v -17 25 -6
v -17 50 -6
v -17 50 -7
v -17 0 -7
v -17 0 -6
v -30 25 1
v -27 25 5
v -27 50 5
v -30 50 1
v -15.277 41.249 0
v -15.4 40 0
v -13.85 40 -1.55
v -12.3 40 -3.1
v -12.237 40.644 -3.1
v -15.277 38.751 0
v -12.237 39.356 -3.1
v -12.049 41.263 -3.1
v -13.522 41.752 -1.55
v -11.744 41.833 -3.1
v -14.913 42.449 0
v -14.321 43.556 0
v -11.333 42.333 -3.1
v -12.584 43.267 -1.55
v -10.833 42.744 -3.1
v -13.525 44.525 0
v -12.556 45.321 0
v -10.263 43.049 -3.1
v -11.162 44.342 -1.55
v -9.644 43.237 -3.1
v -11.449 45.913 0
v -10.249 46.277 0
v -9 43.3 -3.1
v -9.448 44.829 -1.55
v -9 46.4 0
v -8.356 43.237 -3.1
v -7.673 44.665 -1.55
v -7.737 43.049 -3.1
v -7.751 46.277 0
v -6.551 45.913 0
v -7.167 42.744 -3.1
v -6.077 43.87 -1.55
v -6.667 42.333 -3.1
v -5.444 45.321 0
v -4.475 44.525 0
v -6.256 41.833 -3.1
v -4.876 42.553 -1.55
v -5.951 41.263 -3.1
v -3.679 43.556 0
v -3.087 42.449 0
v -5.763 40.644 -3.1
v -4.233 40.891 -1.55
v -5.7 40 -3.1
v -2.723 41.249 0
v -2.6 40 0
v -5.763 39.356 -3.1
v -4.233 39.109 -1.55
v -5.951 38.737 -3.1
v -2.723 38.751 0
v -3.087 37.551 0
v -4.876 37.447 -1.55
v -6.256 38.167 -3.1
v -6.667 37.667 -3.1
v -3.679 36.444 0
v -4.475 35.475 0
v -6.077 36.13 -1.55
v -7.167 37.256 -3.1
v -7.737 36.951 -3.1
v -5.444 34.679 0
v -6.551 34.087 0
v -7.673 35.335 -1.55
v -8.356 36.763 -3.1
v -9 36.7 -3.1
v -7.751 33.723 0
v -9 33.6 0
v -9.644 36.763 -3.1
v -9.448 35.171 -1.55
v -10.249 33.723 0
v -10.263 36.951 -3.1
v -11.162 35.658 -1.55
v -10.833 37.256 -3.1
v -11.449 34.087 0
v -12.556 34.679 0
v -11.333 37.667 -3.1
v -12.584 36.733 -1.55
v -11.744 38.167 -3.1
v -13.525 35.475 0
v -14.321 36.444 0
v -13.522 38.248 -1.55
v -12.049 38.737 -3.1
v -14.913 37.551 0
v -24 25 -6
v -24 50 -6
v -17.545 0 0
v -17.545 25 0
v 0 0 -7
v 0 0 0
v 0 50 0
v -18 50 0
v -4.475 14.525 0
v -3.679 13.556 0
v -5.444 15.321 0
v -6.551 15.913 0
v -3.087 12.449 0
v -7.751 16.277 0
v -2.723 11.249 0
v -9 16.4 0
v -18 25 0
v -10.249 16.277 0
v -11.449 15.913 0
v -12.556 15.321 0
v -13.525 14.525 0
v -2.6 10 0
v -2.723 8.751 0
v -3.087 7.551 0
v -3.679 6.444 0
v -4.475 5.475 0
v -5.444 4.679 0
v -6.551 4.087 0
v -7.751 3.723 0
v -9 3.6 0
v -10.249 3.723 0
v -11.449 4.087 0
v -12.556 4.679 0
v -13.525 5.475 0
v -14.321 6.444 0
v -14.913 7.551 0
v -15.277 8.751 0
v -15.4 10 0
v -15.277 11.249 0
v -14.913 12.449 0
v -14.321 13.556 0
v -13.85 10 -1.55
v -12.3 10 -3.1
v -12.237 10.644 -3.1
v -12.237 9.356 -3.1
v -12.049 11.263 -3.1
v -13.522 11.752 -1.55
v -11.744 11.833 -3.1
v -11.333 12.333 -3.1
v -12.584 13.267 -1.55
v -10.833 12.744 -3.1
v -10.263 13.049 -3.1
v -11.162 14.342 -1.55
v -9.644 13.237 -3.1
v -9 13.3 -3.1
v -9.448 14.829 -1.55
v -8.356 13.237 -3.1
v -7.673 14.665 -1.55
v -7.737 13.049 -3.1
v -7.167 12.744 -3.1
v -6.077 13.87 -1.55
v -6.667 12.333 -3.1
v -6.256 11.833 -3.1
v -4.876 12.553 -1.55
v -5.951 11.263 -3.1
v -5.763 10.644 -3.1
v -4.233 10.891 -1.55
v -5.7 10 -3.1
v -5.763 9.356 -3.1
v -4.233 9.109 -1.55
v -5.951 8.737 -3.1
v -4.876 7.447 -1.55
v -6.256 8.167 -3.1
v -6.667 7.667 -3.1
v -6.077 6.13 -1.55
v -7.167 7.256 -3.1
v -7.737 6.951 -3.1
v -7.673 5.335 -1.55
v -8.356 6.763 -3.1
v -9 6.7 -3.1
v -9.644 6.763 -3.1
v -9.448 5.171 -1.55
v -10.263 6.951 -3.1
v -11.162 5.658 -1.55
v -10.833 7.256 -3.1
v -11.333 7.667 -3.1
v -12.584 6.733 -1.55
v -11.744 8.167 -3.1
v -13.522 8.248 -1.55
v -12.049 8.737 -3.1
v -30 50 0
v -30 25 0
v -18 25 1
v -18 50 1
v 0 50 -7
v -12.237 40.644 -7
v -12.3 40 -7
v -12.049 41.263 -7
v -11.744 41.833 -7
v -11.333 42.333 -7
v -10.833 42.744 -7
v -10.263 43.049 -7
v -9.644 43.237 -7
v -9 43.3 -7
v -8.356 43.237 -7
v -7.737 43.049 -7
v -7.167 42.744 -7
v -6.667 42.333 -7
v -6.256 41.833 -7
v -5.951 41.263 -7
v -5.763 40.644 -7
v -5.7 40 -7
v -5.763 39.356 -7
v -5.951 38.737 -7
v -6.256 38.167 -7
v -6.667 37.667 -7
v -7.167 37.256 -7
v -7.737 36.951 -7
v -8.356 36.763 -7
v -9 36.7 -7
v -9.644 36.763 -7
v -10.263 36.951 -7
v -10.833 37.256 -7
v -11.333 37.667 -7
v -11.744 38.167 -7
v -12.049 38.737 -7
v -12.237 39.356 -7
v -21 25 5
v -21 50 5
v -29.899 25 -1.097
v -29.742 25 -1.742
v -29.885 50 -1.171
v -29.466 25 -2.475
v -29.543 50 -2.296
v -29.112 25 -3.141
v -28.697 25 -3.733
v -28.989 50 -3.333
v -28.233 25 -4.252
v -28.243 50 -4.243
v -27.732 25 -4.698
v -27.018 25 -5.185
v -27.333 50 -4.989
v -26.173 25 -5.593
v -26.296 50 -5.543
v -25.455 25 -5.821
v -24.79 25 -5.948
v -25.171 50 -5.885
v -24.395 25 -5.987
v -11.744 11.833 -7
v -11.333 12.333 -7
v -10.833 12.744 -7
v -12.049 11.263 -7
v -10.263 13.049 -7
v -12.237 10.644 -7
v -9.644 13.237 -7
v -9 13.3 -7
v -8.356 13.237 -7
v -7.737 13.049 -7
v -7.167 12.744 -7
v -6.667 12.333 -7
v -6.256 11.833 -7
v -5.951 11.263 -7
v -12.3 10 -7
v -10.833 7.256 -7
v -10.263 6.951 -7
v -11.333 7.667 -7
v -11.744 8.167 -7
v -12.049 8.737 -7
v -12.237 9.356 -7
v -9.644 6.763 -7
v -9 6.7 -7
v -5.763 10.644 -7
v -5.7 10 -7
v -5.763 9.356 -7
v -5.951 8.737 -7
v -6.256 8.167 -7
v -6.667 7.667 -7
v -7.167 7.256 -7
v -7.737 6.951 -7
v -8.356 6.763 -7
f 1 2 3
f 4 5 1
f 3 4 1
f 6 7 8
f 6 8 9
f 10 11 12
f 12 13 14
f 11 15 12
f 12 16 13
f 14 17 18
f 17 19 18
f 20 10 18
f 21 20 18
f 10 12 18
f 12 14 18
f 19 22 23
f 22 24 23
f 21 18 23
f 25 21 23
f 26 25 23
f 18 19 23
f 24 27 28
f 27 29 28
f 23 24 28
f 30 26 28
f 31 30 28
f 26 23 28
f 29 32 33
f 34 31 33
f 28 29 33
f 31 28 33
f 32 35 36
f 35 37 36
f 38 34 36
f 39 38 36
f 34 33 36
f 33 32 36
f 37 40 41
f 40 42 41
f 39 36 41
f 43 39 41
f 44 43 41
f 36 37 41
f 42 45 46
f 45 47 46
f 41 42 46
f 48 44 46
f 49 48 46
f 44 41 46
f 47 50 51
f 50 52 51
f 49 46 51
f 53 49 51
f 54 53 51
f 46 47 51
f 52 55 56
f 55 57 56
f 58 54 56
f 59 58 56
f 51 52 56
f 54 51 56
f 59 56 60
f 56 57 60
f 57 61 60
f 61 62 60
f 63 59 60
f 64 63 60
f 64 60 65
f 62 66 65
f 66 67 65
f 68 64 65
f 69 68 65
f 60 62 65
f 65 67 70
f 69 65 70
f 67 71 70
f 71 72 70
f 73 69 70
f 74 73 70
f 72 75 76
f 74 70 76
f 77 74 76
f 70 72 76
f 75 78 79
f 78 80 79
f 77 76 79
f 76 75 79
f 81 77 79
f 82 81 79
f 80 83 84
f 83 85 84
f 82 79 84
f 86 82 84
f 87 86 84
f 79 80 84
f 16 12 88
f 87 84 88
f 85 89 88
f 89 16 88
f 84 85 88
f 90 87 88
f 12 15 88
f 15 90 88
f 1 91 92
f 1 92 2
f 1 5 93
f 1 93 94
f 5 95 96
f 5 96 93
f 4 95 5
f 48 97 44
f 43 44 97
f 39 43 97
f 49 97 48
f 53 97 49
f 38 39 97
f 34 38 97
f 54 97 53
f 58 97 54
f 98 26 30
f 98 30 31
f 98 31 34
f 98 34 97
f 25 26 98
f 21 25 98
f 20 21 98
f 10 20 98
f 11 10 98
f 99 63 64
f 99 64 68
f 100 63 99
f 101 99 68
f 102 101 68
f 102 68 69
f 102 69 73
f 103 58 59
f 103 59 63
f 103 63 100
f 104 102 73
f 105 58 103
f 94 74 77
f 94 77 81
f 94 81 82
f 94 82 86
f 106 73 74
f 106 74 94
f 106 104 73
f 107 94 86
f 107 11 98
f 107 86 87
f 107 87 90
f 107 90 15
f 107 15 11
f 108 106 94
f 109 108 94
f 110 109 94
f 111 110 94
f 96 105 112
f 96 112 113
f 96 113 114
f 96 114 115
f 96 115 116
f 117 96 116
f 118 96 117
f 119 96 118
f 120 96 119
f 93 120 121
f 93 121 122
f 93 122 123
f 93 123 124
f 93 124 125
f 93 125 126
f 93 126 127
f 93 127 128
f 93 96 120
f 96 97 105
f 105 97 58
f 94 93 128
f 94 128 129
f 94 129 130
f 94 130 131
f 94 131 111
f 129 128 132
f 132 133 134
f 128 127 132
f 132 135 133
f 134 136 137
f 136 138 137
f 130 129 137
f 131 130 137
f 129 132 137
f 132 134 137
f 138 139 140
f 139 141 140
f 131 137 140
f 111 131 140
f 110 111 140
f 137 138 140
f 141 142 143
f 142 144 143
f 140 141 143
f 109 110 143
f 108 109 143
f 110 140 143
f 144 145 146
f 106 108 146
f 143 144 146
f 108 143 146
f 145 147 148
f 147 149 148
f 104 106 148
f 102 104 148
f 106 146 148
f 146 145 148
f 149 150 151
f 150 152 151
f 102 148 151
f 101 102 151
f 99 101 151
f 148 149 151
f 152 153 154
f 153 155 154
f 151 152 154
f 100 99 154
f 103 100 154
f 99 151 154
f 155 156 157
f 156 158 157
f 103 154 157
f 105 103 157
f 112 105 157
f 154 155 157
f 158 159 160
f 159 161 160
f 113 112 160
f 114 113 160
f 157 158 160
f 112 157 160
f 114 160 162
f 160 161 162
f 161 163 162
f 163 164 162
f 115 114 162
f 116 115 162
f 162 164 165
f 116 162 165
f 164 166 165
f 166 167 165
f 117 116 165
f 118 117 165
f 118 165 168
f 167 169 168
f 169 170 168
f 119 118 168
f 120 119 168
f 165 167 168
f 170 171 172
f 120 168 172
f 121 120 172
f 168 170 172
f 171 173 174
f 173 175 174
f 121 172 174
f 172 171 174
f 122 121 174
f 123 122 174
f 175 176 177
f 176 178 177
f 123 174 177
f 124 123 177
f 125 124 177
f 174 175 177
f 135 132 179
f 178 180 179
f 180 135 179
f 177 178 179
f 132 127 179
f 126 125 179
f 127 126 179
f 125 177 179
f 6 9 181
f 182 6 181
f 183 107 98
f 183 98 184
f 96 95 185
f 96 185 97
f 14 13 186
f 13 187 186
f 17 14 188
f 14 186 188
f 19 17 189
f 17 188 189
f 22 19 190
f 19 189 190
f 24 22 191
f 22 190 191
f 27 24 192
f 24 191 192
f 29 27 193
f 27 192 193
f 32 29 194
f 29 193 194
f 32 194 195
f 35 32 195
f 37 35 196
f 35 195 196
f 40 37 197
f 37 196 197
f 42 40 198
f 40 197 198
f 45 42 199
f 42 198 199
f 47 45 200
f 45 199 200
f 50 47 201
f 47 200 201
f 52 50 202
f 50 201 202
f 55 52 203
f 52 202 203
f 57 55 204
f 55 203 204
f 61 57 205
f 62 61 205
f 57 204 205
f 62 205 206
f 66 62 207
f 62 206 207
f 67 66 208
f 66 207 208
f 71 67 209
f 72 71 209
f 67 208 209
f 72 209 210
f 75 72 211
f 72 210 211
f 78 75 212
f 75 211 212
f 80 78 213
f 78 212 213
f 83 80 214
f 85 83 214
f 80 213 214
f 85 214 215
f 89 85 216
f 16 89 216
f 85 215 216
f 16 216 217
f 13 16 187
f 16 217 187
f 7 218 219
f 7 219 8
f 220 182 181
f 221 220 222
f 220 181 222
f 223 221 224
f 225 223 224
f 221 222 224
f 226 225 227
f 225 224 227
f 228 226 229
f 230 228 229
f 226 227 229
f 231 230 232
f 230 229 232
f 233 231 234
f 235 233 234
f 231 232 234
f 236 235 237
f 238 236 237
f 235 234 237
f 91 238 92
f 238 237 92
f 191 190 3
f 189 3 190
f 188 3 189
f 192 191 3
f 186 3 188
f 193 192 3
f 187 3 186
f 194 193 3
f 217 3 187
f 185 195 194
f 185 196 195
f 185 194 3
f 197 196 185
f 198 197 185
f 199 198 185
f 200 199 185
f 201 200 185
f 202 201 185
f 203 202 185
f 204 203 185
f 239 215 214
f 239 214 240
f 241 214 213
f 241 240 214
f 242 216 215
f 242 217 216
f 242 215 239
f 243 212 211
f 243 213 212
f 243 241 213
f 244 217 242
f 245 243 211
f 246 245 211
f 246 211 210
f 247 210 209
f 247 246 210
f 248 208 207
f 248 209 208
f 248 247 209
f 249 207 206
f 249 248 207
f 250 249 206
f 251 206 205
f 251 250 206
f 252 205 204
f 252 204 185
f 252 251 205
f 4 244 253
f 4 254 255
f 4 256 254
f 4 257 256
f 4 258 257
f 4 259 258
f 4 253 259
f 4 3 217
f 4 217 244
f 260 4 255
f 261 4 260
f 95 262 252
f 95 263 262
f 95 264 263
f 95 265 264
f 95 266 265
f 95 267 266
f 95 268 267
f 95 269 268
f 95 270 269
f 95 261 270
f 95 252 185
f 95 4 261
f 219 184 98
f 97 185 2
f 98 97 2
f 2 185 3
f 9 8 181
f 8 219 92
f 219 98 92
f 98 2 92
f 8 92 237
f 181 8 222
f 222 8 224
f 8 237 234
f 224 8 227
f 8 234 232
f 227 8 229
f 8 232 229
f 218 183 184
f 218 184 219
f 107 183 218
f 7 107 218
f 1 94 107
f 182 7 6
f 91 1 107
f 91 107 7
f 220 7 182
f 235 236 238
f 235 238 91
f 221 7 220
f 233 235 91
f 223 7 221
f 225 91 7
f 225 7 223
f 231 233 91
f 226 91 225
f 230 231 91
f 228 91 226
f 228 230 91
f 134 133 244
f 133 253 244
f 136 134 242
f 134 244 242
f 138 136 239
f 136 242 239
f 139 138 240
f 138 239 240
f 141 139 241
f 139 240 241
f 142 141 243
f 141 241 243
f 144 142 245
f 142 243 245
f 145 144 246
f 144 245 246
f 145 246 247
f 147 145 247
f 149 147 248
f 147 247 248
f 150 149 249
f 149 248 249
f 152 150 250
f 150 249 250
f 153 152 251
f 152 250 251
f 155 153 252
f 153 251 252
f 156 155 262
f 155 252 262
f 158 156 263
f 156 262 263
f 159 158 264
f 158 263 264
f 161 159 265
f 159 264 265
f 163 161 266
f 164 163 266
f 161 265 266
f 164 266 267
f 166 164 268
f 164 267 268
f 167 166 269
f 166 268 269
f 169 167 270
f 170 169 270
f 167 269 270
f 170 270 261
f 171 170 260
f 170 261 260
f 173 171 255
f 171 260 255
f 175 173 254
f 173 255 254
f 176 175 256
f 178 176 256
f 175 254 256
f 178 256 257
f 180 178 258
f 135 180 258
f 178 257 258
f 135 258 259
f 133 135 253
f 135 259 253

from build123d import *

# Parameters (mm, degrees)
EXTRUDE_1_DEPTH           = 50
FILLET_1_R                = 6
HOLE_WIZARD_1_D           = 6.6
HOLE_WIZARD_1_CSINK_D     = 12.8
HOLE_WIZARD_1_CSINK_ANGLE = 90


with BuildPart() as part:
    # 草图1 → 凸台-拉伸1 (new body)
    with BuildSketch(Plane(origin=(0, 0, 0), x_dir=(1, 0, 0), z_dir=(0, 1, 0))):
        Polygon((0, 0), (-18, 0), (-18, -1), (-21, -5), (-27, -5), (-30, -1), (-30, 6), (-17, 6), (-17, 7), (0, 7), align=None)
    extrude(amount=EXTRUDE_1_DEPTH)

    # 圆角1
    fillet_1_edges = [part.edges().sort_by_distance(p)[0] for p in [
        (-30, 25, -6),
    ]]
    fillet(fillet_1_edges, radius=FILLET_1_R)

    # 打孔尺寸根据内六角花形半沉头螺钉的类型1 (through all)
    with Locations(Plane.XY):
        with Locations((-9, 40), (-9, 10)):
            CounterSinkHole(HOLE_WIZARD_1_D / 2, HOLE_WIZARD_1_CSINK_D / 2, counter_sink_angle=HOLE_WIZARD_1_CSINK_ANGLE)

    # 草图2 → 切除-放样1 section 0
    with BuildSketch(Plane.XY.offset(5)):
        with BuildLine():
            Line((-30, 0), (-18, 0))
            Line((-18, 0), (-18, 25))
            Line((-18, 25), (-30, 25))
            Line((-30, 25), (-30, 0))
        make_face()
    # 草图5 → 切除-放样1 section 1
    with BuildSketch(Plane(origin=(0, 0, -6), x_dir=(-1, 0, 0), z_dir=(0, 0, -1))):
        with BuildLine():
            Line((30, 25), (17, 25))
            Line((17, 25), (17, 0))
            Line((17, 0), (30, 0))
            Line((30, 0), (30, 25))
        make_face()
    loft(mode=Mode.SUBTRACT)


solid = part.part
